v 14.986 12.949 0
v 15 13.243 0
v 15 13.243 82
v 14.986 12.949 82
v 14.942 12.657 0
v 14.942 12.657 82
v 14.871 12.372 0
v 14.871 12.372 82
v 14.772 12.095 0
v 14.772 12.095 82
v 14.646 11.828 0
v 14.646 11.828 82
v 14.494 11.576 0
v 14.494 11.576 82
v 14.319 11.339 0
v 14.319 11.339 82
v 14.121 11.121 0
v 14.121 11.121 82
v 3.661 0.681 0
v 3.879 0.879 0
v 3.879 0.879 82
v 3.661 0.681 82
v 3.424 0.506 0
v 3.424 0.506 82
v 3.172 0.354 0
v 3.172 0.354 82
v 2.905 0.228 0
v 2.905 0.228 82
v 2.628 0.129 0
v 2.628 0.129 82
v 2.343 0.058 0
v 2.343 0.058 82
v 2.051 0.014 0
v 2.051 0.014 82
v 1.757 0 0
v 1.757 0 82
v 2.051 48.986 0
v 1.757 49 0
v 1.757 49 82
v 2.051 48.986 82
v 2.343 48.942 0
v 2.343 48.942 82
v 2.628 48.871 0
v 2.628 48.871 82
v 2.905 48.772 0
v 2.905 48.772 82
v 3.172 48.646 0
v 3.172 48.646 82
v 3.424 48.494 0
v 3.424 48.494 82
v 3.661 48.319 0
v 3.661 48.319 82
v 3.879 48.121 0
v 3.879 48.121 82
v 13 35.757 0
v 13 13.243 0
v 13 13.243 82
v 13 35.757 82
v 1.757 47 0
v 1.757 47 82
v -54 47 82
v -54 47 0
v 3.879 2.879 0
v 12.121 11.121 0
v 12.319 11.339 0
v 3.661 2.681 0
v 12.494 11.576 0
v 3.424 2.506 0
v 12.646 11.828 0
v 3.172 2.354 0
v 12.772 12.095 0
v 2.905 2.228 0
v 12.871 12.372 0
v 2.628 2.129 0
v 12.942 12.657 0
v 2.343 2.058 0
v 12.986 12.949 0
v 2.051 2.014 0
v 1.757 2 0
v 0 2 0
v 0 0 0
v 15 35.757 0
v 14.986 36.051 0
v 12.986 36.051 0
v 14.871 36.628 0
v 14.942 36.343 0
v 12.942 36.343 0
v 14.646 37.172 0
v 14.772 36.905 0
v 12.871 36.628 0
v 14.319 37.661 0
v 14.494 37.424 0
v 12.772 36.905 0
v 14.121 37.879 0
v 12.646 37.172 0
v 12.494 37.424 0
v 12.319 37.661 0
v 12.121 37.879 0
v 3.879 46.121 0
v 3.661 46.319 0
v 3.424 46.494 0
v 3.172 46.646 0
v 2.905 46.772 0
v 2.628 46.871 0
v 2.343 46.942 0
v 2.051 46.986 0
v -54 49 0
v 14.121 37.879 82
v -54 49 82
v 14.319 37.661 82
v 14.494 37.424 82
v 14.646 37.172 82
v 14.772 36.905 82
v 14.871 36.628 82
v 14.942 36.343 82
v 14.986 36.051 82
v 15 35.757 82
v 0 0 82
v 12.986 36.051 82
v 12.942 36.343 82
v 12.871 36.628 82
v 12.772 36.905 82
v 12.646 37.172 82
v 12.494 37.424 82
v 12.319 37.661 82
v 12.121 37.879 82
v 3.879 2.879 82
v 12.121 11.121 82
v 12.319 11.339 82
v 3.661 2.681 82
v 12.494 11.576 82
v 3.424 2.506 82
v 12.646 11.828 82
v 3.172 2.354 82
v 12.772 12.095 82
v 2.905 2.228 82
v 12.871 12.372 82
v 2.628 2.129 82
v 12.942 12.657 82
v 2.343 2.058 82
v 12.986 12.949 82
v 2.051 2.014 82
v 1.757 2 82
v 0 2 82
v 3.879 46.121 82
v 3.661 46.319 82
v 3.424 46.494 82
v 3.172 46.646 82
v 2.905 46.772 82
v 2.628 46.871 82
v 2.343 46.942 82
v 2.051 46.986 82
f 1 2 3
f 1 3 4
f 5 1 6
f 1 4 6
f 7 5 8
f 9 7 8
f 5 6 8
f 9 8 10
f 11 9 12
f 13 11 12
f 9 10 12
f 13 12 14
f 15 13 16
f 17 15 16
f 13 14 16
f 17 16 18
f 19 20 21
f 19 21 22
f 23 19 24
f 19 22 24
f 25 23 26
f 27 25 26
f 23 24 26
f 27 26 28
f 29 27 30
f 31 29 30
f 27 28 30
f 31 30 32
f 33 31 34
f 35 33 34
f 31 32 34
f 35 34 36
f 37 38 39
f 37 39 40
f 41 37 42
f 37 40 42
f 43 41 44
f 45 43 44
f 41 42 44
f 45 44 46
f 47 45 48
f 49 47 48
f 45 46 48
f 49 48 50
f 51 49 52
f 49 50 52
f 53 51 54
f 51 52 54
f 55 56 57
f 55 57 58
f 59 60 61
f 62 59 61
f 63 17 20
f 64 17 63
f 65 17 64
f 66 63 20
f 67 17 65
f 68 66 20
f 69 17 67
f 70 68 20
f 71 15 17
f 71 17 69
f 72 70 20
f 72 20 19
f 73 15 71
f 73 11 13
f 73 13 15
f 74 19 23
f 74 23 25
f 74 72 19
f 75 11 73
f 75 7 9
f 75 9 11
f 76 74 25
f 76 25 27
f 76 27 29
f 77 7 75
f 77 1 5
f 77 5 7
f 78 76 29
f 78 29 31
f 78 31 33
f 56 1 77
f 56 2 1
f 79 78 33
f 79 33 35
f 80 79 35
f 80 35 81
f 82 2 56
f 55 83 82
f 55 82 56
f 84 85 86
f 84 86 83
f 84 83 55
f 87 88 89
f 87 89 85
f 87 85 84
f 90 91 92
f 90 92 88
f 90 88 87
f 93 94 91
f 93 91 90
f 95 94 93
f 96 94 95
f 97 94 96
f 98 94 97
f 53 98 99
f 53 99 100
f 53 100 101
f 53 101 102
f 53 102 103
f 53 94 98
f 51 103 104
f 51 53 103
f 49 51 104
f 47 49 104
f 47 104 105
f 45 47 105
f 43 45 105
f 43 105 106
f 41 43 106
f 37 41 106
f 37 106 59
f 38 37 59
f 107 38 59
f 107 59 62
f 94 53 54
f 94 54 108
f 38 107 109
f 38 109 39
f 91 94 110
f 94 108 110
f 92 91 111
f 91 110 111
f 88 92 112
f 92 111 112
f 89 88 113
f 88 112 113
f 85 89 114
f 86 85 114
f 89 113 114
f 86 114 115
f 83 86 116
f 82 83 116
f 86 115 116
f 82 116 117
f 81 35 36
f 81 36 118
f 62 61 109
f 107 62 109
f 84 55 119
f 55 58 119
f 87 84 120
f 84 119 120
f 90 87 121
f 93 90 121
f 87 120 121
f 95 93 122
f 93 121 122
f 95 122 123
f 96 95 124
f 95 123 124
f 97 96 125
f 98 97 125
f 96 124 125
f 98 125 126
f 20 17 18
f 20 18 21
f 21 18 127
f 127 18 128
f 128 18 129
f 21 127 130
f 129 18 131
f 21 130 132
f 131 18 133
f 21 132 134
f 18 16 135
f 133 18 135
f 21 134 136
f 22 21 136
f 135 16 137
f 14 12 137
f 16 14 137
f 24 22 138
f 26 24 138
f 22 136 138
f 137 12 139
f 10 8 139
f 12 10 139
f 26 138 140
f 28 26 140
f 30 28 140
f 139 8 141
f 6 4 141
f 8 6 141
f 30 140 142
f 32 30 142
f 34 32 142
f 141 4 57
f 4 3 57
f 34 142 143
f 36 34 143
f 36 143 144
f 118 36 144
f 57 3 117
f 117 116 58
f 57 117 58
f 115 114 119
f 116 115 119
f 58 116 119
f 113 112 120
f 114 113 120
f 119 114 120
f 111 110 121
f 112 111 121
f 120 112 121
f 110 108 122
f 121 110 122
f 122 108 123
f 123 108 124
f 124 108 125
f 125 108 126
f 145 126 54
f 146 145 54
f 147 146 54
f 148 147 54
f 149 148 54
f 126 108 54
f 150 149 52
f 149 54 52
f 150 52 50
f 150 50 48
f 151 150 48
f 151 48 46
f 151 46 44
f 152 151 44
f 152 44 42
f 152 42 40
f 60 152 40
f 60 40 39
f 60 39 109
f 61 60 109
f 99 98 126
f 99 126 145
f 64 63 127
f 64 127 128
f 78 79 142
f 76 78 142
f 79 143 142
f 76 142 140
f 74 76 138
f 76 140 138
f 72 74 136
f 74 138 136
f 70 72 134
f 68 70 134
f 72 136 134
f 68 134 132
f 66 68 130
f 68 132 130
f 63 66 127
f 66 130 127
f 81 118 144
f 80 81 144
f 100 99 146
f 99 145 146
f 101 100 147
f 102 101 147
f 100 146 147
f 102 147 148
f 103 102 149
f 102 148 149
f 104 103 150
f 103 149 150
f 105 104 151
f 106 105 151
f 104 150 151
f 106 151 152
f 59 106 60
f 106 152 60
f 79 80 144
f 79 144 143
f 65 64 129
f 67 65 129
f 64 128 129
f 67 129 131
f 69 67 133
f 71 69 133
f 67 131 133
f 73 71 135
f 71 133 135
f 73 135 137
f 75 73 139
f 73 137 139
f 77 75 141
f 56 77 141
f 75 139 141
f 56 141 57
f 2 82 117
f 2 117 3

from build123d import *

# Parameters (mm, degrees)
EXTRUDE_1_DEPTH = 82
FILLET_1_R      = 3


with BuildPart() as part:
    # 草图1 → 凸台-拉伸1 (new body)
    with BuildSketch(Plane.XY):
        Polygon((0, 0), (0, 2), (3, 2), (13, 12), (13, 37), (3, 47), (-54, 47), (-54, 49), (3, 49), (15, 37), (15, 12), (3, 0), align=None)
    extrude(amount=EXTRUDE_1_DEPTH)

    # 圆角1
    fillet_1_edges = [part.edges().sort_by_distance(p)[0] for p in [
        (3, 2, 41),
        (13, 12, 41),
        (13, 37, 41),
        (3, 47, 41),
        (3, 49, 41),
        (15, 37, 41),
        (15, 12, 41),
        (3, 0, 41),
    ]]
    fillet(fillet_1_edges, radius=FILLET_1_R)


solid = part.part
